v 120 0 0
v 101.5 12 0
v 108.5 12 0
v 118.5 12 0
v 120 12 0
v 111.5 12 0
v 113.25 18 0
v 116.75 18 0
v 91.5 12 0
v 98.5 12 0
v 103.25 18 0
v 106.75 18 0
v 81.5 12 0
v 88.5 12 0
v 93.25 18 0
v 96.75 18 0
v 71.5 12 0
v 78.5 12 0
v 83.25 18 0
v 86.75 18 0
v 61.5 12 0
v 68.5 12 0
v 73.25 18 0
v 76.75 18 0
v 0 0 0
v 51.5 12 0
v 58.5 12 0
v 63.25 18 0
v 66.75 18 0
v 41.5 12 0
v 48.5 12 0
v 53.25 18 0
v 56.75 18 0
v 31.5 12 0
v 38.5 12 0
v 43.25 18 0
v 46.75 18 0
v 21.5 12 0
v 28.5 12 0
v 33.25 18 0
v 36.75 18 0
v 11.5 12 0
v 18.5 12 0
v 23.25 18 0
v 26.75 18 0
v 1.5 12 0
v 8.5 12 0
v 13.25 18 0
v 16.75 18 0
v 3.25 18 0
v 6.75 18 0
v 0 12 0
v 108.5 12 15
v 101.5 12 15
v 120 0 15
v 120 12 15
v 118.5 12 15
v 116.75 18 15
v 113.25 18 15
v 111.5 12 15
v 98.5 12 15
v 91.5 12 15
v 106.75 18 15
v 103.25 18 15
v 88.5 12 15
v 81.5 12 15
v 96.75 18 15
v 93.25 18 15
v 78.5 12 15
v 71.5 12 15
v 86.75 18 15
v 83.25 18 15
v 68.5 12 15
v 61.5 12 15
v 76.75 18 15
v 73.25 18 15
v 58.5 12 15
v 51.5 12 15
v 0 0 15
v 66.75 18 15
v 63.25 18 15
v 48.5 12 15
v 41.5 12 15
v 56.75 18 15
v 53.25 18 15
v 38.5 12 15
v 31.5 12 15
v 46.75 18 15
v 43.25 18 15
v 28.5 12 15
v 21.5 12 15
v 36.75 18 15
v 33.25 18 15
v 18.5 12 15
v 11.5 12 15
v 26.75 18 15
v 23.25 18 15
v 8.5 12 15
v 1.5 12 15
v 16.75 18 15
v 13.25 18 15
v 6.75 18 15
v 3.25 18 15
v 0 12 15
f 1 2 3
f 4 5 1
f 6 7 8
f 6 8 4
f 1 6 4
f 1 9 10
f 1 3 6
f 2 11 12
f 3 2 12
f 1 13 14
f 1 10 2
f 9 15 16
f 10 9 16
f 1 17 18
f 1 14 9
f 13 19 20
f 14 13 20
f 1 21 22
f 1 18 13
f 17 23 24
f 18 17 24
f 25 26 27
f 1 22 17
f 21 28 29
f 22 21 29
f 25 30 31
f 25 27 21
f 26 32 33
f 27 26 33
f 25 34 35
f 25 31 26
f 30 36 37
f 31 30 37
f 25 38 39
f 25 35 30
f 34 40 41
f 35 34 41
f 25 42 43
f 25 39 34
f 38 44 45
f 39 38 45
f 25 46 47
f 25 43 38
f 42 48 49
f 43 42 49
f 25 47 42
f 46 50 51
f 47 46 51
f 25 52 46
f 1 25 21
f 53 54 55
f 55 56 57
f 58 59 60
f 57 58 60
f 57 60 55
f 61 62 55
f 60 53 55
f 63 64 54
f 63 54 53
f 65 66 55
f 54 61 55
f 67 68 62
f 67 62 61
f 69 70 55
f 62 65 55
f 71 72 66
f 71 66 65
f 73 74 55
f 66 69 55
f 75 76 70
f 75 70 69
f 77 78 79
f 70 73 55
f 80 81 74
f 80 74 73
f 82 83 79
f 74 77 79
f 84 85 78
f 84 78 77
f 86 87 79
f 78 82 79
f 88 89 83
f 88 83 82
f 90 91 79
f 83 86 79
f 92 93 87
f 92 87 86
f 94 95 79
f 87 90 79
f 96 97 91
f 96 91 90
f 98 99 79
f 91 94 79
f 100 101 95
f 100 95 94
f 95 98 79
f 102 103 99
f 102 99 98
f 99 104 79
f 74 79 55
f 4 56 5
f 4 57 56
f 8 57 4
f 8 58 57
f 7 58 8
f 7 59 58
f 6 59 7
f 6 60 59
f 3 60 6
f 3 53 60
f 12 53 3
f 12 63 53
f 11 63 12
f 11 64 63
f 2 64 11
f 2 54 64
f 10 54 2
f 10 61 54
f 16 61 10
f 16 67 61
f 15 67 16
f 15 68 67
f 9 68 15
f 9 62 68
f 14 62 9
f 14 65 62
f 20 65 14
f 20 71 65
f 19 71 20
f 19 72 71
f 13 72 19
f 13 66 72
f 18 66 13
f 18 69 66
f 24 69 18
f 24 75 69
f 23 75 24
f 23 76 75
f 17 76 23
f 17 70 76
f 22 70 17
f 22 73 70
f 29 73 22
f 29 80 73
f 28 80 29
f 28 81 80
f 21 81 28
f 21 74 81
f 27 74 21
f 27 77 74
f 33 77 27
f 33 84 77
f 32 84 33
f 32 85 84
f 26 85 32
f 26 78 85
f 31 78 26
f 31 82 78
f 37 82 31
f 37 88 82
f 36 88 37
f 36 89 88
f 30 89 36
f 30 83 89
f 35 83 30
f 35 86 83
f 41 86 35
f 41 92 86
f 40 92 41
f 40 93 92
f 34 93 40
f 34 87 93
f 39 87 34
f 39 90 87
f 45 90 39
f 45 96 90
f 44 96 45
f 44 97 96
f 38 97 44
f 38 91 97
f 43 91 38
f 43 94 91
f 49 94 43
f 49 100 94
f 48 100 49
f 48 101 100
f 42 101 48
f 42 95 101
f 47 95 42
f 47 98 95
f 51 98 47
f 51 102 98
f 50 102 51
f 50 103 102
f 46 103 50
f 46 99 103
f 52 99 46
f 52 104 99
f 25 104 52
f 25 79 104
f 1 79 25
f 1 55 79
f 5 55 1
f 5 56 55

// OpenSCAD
$fn = 32;

// ----------------------------------------------------------------------
// Gear rack: 12 teeth, pitch 10 mm
// ----------------------------------------------------------------------

// --- parameters (mm) ---
teeth = 12;               // number of teeth
pitch = 10;               // tooth pitch, X
root_w = 7;               // tooth width at the root
tip_w = 3.5;              // tooth width at the tip
base_h = 12;              // rack body height, Y
tooth_h = 6;              // tooth height above the body
plate_t = 15;             // rack width, Z (extrusion height)
fit_tol = 0.02;           // declared fit tolerance (prompt contract)
free_tol = 0.2;           // declared free tolerance (prompt contract)

rack_l = teeth * pitch;  // overall length
total_h = base_h + tooth_h;  // overall height

profile = [[0, 0], [120, 0], [120, 12], [118.5, 12], [116.75, 18], [113.25, 18], [111.5, 12], [108.5, 12], [106.75, 18], [103.25, 18], [101.5, 12], [98.5, 12], [96.75, 18], [93.25, 18], [91.5, 12], [88.5, 12], [86.75, 18], [83.25, 18], [81.5, 12], [78.5, 12], [76.75, 18], [73.25, 18], [71.5, 12], [68.5, 12], [66.75, 18], [63.25, 18], [61.5, 12], [58.5, 12], [56.75, 18], [53.25, 18], [51.5, 12], [48.5, 12], [46.75, 18], [43.25, 18], [41.5, 12], [38.5, 12], [36.75, 18], [33.25, 18], [31.5, 12], [28.5, 12], [26.75, 18], [23.25, 18], [21.5, 12], [18.5, 12], [16.75, 18], [13.25, 18], [11.5, 12], [8.5, 12], [6.75, 18], [3.25, 18], [1.5, 12], [0, 12]];  // primary outline, 52 points, counter clockwise

// --- the one profile operation ---
linear_extrude(height = plate_t) polygon(points = profile);
